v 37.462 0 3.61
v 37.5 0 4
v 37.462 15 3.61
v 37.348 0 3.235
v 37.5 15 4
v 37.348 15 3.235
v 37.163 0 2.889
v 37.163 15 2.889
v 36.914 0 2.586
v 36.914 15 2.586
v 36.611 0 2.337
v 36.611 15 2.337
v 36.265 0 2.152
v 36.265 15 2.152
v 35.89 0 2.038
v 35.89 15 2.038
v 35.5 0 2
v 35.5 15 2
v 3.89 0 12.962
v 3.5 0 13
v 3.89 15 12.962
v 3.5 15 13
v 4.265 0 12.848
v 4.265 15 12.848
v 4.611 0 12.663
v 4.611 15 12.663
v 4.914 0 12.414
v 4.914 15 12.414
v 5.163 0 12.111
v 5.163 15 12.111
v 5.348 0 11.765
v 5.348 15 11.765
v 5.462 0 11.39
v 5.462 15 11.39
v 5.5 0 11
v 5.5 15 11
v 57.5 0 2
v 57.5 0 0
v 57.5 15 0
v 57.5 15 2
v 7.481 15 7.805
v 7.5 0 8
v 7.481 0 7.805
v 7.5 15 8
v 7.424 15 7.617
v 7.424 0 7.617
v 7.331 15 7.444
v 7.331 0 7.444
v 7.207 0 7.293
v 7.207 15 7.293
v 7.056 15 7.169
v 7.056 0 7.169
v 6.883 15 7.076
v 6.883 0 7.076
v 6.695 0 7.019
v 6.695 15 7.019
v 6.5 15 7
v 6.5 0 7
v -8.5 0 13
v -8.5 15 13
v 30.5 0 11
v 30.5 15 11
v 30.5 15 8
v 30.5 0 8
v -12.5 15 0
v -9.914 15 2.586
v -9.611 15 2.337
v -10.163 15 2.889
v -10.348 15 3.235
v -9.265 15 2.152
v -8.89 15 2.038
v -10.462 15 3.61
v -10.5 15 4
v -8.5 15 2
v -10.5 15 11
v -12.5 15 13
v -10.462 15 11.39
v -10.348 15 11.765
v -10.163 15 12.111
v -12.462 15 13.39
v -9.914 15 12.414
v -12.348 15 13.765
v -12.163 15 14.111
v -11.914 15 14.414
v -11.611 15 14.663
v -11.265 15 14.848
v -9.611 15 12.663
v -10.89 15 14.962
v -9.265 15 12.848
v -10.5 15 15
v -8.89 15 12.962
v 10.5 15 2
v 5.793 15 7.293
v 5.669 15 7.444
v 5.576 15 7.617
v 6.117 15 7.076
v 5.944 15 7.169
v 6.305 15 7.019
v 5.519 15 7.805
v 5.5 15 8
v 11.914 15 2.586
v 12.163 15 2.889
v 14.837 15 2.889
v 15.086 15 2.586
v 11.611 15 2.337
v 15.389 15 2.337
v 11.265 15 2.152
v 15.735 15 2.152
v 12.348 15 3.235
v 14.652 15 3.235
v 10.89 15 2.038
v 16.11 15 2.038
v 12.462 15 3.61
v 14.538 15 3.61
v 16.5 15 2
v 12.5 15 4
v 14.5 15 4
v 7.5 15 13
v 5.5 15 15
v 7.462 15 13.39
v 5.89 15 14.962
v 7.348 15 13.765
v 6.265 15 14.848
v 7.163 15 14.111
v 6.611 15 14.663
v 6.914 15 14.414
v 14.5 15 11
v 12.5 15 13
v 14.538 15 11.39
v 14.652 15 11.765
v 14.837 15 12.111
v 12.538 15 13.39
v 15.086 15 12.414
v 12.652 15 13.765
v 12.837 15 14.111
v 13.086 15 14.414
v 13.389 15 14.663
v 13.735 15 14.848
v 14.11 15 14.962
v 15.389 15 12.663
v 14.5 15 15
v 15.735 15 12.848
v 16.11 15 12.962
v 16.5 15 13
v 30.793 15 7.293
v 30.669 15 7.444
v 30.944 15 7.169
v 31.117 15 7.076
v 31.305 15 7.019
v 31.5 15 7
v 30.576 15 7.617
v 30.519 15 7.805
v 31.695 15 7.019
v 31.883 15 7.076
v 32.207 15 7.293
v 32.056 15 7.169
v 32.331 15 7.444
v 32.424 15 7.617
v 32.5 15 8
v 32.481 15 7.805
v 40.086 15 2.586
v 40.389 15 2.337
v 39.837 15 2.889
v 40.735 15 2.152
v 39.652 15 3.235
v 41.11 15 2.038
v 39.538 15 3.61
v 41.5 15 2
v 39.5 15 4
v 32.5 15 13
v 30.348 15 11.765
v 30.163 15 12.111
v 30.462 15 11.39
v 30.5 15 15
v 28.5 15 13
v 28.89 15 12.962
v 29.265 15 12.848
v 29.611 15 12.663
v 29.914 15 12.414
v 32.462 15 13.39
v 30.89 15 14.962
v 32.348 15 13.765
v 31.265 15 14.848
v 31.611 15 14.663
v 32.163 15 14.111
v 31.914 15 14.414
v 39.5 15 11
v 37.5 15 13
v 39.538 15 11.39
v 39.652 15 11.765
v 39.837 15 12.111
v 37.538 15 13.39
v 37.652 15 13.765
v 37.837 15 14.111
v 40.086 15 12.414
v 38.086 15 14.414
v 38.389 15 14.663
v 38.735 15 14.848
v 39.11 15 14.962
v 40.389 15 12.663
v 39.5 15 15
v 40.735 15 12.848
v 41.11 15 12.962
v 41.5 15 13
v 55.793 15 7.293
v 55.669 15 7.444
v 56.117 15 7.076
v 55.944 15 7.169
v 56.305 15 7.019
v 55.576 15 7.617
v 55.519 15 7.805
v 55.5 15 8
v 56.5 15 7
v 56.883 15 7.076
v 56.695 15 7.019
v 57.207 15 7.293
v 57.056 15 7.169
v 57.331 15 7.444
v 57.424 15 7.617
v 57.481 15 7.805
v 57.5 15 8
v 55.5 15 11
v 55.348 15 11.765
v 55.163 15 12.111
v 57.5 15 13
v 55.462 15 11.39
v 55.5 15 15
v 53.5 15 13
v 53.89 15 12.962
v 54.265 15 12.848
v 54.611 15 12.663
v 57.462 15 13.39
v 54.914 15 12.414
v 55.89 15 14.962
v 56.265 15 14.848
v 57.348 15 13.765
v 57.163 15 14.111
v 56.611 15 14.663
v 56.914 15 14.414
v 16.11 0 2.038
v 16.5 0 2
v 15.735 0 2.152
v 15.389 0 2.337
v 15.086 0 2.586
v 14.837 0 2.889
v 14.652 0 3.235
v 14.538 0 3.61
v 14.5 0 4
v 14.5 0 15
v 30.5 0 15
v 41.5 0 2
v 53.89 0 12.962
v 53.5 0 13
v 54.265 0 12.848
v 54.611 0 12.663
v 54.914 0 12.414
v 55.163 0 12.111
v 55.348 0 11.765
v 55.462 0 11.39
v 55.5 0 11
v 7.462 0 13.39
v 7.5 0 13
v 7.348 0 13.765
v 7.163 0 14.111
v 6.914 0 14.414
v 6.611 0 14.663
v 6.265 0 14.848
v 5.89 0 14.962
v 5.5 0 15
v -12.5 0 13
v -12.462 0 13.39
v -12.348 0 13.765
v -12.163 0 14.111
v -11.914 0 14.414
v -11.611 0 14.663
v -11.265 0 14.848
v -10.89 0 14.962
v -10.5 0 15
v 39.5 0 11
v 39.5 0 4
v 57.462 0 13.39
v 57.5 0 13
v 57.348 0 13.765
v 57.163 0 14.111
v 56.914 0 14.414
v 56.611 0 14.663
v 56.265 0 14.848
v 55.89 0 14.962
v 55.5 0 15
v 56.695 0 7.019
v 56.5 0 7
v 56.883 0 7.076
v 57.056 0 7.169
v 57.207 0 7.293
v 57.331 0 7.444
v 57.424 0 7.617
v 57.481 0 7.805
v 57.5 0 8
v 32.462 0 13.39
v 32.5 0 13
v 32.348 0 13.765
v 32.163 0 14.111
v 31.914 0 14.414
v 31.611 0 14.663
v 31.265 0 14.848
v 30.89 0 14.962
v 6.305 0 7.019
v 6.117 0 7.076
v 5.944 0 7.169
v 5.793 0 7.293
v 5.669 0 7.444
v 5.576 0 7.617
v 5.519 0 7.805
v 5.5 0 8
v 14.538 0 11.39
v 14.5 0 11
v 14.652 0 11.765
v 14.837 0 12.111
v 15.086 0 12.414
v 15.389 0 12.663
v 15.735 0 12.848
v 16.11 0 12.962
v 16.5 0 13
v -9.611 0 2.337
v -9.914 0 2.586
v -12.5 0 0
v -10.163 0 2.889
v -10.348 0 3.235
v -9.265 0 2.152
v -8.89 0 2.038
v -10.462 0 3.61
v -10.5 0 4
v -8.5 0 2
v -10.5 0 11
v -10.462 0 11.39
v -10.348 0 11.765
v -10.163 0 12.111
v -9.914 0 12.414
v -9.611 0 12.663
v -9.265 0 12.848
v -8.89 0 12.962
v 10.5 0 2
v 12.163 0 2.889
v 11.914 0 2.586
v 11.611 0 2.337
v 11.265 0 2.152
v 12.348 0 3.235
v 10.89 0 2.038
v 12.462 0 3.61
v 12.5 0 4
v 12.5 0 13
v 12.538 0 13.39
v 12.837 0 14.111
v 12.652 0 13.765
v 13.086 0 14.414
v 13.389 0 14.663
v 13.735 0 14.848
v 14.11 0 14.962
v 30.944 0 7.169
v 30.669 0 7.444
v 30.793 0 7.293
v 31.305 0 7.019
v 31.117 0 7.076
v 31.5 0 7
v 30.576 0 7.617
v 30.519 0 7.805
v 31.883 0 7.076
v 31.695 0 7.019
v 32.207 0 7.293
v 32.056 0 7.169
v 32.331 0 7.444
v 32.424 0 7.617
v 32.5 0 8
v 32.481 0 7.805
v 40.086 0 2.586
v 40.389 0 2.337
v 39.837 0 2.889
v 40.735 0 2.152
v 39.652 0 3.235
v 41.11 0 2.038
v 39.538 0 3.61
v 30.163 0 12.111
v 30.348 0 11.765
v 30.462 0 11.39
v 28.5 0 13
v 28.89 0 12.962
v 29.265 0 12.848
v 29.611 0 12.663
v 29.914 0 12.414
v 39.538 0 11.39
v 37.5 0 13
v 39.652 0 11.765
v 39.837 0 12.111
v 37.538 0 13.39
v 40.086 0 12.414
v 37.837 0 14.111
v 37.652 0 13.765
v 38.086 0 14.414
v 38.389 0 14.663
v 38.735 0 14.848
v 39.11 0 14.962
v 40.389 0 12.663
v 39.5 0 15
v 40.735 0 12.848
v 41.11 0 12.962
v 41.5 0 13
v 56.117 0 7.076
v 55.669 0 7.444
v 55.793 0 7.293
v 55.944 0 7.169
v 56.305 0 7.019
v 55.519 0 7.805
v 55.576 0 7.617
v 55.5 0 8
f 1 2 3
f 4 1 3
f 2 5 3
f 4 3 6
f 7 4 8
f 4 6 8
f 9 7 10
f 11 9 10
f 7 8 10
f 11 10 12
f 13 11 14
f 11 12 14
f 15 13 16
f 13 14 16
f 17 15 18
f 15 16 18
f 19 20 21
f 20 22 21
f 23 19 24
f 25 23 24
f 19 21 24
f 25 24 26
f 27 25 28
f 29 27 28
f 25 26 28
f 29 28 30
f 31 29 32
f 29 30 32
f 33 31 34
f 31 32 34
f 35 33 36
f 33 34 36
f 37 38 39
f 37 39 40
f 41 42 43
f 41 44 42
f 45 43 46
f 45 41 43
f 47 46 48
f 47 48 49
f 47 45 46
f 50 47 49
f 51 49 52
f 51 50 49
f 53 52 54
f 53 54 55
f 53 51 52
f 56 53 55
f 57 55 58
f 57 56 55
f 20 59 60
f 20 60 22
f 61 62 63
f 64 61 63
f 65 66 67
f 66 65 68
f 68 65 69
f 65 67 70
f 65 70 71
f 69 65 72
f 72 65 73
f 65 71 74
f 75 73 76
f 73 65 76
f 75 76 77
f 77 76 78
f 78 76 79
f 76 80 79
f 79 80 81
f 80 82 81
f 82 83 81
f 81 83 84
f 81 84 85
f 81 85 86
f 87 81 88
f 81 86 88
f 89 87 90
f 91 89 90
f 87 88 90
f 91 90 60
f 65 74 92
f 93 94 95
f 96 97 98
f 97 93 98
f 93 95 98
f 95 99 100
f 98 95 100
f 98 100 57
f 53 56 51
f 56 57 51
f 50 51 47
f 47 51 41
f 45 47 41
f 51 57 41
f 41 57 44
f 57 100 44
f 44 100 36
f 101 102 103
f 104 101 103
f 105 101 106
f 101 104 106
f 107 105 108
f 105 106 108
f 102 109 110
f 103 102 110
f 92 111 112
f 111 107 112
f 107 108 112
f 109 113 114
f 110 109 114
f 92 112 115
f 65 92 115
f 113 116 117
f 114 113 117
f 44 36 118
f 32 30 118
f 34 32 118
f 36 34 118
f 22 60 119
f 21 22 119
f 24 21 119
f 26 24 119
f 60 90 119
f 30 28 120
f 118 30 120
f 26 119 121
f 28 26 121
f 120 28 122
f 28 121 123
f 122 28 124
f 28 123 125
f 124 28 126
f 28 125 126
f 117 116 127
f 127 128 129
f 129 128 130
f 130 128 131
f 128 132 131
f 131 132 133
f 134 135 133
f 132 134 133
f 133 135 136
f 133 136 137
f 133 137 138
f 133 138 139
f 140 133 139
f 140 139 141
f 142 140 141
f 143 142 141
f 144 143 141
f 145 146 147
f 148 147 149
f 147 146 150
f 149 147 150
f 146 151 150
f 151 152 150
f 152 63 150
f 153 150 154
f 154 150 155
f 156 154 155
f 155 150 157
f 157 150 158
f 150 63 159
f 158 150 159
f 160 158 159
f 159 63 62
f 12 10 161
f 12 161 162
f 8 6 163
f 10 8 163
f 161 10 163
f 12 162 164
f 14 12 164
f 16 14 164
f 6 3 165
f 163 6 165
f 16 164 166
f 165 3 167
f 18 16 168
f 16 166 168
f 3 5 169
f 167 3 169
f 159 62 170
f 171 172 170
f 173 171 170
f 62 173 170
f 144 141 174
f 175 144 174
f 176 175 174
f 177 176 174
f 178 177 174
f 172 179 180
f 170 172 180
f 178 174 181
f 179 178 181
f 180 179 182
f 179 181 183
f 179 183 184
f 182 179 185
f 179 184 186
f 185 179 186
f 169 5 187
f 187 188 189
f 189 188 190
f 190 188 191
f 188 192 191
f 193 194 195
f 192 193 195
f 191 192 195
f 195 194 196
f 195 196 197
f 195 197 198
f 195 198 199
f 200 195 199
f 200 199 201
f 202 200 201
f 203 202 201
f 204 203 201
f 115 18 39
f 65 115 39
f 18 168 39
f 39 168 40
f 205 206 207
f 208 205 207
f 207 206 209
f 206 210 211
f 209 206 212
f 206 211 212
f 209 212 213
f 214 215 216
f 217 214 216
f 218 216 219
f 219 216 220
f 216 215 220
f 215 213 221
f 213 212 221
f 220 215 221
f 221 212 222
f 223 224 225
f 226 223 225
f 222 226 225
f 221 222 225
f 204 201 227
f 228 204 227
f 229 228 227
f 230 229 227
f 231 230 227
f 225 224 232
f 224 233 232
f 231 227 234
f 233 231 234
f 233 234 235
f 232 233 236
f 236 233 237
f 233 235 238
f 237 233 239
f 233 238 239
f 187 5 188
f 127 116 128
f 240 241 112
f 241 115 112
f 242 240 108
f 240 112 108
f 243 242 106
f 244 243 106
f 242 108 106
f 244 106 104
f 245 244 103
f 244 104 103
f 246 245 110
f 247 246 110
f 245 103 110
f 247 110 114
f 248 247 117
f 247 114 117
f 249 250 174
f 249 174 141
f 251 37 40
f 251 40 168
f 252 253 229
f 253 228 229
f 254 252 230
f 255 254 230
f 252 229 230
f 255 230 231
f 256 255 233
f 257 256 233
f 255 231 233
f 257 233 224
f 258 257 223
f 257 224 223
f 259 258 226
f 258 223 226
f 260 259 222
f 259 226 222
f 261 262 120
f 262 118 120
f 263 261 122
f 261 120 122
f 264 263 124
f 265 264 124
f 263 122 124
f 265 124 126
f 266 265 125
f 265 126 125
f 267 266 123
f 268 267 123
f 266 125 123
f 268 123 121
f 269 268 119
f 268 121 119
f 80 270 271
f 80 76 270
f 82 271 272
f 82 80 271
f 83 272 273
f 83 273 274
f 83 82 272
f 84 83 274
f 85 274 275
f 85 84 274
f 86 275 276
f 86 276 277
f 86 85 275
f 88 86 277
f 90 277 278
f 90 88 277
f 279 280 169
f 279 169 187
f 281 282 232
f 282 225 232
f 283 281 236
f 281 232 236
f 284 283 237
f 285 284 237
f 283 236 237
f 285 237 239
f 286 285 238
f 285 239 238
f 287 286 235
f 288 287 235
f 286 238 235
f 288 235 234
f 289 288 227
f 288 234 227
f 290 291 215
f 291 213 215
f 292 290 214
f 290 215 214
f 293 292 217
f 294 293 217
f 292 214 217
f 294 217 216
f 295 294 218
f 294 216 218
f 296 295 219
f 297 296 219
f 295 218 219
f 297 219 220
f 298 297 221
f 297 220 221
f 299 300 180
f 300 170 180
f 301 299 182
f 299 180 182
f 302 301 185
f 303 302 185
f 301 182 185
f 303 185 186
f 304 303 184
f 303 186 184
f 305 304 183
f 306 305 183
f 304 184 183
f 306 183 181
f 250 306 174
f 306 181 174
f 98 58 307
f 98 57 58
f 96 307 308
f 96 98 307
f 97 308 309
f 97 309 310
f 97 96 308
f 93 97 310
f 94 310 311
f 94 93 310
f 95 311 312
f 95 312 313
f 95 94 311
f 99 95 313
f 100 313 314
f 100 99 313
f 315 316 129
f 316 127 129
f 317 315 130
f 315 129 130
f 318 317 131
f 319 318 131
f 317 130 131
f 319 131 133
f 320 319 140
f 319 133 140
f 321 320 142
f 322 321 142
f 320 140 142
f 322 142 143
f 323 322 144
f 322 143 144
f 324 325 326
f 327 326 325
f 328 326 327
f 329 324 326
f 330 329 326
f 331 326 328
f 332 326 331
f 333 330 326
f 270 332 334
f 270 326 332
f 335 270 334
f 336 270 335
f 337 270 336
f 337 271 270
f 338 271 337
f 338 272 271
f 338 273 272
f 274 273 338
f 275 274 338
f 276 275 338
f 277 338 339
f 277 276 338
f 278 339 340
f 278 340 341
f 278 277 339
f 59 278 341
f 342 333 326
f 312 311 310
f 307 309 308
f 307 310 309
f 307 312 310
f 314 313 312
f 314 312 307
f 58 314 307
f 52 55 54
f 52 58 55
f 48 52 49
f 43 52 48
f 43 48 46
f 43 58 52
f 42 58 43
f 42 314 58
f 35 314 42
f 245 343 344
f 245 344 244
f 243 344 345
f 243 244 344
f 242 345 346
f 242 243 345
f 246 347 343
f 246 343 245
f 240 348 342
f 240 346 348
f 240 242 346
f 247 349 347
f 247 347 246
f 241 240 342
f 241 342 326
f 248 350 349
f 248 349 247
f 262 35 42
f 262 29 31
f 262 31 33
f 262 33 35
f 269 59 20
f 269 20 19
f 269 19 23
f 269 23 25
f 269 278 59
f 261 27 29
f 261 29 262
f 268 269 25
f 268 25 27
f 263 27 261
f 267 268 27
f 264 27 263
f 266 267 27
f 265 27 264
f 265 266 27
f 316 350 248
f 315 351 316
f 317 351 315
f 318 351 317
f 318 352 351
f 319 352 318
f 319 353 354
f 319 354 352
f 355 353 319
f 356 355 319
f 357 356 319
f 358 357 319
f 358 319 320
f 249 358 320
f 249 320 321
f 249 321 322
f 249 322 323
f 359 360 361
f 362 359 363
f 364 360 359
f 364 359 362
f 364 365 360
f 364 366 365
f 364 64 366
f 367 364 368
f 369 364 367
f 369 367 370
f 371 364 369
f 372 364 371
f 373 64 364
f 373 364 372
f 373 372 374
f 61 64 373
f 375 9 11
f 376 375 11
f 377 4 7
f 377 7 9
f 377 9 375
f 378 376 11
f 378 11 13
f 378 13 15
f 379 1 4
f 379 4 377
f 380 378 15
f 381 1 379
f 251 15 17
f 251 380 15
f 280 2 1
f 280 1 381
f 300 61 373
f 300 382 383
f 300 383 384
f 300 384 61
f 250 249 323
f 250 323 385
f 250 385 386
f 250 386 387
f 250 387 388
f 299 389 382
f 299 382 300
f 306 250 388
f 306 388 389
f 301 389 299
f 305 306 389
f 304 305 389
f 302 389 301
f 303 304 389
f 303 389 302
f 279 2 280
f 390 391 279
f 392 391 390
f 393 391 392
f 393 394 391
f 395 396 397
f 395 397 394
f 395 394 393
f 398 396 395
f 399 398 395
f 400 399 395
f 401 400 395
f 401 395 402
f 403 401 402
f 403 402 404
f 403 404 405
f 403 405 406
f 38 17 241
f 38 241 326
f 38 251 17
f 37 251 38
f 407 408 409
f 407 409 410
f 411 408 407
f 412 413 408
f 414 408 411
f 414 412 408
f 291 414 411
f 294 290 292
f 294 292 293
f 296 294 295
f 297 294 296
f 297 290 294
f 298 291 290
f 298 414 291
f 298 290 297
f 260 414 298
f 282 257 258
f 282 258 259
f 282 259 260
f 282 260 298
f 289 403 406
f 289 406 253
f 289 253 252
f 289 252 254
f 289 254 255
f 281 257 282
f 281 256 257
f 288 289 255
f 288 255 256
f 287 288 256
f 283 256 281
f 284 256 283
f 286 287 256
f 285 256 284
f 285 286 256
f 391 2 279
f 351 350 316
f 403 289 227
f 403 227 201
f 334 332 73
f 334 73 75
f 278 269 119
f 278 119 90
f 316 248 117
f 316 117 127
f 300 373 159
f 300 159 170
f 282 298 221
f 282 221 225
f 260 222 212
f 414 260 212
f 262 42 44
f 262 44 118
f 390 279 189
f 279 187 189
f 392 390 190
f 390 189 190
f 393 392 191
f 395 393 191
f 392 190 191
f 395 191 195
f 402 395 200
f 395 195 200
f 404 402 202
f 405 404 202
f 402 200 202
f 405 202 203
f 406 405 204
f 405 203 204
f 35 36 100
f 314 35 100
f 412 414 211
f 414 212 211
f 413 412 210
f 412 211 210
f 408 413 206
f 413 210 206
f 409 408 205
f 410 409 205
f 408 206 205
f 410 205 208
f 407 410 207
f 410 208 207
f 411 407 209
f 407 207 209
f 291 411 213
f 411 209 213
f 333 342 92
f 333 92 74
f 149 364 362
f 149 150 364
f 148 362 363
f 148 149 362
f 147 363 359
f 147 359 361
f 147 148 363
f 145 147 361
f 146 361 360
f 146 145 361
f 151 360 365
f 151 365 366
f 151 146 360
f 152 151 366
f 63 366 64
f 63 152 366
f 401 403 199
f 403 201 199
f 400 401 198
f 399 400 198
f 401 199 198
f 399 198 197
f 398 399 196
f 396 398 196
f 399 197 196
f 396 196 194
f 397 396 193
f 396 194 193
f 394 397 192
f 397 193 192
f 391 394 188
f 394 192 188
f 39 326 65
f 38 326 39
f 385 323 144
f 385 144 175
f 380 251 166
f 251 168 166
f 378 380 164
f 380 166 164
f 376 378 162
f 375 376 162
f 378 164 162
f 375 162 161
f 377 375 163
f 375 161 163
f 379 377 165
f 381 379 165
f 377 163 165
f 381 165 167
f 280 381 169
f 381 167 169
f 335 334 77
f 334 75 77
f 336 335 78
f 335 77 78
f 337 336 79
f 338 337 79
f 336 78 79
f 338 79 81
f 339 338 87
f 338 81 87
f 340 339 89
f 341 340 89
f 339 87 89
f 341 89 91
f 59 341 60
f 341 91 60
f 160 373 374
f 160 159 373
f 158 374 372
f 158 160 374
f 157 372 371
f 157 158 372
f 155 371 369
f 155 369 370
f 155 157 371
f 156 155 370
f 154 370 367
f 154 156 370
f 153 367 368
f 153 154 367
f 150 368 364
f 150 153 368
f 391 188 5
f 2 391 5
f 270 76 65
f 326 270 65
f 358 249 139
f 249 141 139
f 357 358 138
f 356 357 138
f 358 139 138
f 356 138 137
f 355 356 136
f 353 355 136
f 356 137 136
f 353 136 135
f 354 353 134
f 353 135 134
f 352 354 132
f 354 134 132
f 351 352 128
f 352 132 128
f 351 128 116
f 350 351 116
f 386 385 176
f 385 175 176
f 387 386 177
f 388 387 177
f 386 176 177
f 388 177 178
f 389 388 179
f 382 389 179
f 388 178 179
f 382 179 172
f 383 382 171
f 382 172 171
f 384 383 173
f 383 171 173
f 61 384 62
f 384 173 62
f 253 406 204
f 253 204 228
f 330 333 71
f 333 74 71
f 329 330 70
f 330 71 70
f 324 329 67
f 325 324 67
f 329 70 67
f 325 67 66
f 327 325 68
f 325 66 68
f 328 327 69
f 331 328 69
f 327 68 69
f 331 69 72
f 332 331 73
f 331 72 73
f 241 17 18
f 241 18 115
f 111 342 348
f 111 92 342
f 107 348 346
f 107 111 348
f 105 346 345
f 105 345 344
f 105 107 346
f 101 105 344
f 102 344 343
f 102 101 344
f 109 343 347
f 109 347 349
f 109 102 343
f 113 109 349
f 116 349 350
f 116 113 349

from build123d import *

# Parameters (mm, degrees)
F1_DEPTH = 15
F2_R     = 2
F3_R     = 0.99999
F4_R     = 2


# Not quite as in the source:
# - a fillet or chamfer is up to 0.001 mm smaller than in the source, because OpenCascade refuses the exact size


with BuildPart() as f1:
    # F0 (on Front) → F1 (new body)
    with BuildSketch(Plane.XZ):
        Polygon((-12.5, 15), (-12.5, 0), (57.5, 0), (57.5, 2), (39.5, 2), (39.5, 13), (55.5, 13), (55.5, 7), (57.5, 7), (57.5, 15), (37.5, 15), (37.5, 2), (14.5, 2), (14.5, 13), (30.5, 13), (30.5, 7), (32.5, 7), (32.5, 15), (12.5, 15), (12.5, 2), (-10.5, 2), (-10.5, 13), (5.5, 13), (5.5, 7), (7.5, 7), (7.5, 15), align=None)
    extrude(amount=-F1_DEPTH)

    # F2
    f2_edges = [f1.edges().sort_by_distance(p)[0] for p in [
        (-10.5, 7.5, 2),
        (14.5, 7.5, 2),
        (39.5, 7.5, 2),
        (-10.5, 7.5, 13),
        (14.5, 7.5, 13),
        (39.5, 7.5, 13),
        (37.5, 7.5, 15),
        (12.5, 7.5, 15),
        (-12.5, 7.5, 15),
        (7.5, 7.5, 15),
        (32.5, 7.5, 15),
        (57.5, 7.5, 15),
        (5.5, 7.5, 13),
        (30.5, 7.5, 13),
        (55.5, 7.5, 13),
    ]]
    fillet(f2_edges, radius=F2_R)

    # F3 (radius 1 in the source; OpenCascade refuses exactly that, so slightly less here)
    f3_edges = [f1.edges().sort_by_distance(p)[0] for p in [
        (7.5, 7.5, 7),
        (5.5, 7.5, 7),
        (32.5, 7.5, 7),
        (30.5, 7.5, 7),
        (57.5, 7.5, 7),
        (55.5, 7.5, 7),
    ]]
    fillet(f3_edges, radius=F3_R)

    # F4
    f4_edges = [f1.edges().sort_by_distance(p)[0] for p in [
        (12.5, 7.5, 2),
        (37.5, 7.5, 2),
    ]]
    fillet(f4_edges, radius=F4_R)


solid = f1.part
